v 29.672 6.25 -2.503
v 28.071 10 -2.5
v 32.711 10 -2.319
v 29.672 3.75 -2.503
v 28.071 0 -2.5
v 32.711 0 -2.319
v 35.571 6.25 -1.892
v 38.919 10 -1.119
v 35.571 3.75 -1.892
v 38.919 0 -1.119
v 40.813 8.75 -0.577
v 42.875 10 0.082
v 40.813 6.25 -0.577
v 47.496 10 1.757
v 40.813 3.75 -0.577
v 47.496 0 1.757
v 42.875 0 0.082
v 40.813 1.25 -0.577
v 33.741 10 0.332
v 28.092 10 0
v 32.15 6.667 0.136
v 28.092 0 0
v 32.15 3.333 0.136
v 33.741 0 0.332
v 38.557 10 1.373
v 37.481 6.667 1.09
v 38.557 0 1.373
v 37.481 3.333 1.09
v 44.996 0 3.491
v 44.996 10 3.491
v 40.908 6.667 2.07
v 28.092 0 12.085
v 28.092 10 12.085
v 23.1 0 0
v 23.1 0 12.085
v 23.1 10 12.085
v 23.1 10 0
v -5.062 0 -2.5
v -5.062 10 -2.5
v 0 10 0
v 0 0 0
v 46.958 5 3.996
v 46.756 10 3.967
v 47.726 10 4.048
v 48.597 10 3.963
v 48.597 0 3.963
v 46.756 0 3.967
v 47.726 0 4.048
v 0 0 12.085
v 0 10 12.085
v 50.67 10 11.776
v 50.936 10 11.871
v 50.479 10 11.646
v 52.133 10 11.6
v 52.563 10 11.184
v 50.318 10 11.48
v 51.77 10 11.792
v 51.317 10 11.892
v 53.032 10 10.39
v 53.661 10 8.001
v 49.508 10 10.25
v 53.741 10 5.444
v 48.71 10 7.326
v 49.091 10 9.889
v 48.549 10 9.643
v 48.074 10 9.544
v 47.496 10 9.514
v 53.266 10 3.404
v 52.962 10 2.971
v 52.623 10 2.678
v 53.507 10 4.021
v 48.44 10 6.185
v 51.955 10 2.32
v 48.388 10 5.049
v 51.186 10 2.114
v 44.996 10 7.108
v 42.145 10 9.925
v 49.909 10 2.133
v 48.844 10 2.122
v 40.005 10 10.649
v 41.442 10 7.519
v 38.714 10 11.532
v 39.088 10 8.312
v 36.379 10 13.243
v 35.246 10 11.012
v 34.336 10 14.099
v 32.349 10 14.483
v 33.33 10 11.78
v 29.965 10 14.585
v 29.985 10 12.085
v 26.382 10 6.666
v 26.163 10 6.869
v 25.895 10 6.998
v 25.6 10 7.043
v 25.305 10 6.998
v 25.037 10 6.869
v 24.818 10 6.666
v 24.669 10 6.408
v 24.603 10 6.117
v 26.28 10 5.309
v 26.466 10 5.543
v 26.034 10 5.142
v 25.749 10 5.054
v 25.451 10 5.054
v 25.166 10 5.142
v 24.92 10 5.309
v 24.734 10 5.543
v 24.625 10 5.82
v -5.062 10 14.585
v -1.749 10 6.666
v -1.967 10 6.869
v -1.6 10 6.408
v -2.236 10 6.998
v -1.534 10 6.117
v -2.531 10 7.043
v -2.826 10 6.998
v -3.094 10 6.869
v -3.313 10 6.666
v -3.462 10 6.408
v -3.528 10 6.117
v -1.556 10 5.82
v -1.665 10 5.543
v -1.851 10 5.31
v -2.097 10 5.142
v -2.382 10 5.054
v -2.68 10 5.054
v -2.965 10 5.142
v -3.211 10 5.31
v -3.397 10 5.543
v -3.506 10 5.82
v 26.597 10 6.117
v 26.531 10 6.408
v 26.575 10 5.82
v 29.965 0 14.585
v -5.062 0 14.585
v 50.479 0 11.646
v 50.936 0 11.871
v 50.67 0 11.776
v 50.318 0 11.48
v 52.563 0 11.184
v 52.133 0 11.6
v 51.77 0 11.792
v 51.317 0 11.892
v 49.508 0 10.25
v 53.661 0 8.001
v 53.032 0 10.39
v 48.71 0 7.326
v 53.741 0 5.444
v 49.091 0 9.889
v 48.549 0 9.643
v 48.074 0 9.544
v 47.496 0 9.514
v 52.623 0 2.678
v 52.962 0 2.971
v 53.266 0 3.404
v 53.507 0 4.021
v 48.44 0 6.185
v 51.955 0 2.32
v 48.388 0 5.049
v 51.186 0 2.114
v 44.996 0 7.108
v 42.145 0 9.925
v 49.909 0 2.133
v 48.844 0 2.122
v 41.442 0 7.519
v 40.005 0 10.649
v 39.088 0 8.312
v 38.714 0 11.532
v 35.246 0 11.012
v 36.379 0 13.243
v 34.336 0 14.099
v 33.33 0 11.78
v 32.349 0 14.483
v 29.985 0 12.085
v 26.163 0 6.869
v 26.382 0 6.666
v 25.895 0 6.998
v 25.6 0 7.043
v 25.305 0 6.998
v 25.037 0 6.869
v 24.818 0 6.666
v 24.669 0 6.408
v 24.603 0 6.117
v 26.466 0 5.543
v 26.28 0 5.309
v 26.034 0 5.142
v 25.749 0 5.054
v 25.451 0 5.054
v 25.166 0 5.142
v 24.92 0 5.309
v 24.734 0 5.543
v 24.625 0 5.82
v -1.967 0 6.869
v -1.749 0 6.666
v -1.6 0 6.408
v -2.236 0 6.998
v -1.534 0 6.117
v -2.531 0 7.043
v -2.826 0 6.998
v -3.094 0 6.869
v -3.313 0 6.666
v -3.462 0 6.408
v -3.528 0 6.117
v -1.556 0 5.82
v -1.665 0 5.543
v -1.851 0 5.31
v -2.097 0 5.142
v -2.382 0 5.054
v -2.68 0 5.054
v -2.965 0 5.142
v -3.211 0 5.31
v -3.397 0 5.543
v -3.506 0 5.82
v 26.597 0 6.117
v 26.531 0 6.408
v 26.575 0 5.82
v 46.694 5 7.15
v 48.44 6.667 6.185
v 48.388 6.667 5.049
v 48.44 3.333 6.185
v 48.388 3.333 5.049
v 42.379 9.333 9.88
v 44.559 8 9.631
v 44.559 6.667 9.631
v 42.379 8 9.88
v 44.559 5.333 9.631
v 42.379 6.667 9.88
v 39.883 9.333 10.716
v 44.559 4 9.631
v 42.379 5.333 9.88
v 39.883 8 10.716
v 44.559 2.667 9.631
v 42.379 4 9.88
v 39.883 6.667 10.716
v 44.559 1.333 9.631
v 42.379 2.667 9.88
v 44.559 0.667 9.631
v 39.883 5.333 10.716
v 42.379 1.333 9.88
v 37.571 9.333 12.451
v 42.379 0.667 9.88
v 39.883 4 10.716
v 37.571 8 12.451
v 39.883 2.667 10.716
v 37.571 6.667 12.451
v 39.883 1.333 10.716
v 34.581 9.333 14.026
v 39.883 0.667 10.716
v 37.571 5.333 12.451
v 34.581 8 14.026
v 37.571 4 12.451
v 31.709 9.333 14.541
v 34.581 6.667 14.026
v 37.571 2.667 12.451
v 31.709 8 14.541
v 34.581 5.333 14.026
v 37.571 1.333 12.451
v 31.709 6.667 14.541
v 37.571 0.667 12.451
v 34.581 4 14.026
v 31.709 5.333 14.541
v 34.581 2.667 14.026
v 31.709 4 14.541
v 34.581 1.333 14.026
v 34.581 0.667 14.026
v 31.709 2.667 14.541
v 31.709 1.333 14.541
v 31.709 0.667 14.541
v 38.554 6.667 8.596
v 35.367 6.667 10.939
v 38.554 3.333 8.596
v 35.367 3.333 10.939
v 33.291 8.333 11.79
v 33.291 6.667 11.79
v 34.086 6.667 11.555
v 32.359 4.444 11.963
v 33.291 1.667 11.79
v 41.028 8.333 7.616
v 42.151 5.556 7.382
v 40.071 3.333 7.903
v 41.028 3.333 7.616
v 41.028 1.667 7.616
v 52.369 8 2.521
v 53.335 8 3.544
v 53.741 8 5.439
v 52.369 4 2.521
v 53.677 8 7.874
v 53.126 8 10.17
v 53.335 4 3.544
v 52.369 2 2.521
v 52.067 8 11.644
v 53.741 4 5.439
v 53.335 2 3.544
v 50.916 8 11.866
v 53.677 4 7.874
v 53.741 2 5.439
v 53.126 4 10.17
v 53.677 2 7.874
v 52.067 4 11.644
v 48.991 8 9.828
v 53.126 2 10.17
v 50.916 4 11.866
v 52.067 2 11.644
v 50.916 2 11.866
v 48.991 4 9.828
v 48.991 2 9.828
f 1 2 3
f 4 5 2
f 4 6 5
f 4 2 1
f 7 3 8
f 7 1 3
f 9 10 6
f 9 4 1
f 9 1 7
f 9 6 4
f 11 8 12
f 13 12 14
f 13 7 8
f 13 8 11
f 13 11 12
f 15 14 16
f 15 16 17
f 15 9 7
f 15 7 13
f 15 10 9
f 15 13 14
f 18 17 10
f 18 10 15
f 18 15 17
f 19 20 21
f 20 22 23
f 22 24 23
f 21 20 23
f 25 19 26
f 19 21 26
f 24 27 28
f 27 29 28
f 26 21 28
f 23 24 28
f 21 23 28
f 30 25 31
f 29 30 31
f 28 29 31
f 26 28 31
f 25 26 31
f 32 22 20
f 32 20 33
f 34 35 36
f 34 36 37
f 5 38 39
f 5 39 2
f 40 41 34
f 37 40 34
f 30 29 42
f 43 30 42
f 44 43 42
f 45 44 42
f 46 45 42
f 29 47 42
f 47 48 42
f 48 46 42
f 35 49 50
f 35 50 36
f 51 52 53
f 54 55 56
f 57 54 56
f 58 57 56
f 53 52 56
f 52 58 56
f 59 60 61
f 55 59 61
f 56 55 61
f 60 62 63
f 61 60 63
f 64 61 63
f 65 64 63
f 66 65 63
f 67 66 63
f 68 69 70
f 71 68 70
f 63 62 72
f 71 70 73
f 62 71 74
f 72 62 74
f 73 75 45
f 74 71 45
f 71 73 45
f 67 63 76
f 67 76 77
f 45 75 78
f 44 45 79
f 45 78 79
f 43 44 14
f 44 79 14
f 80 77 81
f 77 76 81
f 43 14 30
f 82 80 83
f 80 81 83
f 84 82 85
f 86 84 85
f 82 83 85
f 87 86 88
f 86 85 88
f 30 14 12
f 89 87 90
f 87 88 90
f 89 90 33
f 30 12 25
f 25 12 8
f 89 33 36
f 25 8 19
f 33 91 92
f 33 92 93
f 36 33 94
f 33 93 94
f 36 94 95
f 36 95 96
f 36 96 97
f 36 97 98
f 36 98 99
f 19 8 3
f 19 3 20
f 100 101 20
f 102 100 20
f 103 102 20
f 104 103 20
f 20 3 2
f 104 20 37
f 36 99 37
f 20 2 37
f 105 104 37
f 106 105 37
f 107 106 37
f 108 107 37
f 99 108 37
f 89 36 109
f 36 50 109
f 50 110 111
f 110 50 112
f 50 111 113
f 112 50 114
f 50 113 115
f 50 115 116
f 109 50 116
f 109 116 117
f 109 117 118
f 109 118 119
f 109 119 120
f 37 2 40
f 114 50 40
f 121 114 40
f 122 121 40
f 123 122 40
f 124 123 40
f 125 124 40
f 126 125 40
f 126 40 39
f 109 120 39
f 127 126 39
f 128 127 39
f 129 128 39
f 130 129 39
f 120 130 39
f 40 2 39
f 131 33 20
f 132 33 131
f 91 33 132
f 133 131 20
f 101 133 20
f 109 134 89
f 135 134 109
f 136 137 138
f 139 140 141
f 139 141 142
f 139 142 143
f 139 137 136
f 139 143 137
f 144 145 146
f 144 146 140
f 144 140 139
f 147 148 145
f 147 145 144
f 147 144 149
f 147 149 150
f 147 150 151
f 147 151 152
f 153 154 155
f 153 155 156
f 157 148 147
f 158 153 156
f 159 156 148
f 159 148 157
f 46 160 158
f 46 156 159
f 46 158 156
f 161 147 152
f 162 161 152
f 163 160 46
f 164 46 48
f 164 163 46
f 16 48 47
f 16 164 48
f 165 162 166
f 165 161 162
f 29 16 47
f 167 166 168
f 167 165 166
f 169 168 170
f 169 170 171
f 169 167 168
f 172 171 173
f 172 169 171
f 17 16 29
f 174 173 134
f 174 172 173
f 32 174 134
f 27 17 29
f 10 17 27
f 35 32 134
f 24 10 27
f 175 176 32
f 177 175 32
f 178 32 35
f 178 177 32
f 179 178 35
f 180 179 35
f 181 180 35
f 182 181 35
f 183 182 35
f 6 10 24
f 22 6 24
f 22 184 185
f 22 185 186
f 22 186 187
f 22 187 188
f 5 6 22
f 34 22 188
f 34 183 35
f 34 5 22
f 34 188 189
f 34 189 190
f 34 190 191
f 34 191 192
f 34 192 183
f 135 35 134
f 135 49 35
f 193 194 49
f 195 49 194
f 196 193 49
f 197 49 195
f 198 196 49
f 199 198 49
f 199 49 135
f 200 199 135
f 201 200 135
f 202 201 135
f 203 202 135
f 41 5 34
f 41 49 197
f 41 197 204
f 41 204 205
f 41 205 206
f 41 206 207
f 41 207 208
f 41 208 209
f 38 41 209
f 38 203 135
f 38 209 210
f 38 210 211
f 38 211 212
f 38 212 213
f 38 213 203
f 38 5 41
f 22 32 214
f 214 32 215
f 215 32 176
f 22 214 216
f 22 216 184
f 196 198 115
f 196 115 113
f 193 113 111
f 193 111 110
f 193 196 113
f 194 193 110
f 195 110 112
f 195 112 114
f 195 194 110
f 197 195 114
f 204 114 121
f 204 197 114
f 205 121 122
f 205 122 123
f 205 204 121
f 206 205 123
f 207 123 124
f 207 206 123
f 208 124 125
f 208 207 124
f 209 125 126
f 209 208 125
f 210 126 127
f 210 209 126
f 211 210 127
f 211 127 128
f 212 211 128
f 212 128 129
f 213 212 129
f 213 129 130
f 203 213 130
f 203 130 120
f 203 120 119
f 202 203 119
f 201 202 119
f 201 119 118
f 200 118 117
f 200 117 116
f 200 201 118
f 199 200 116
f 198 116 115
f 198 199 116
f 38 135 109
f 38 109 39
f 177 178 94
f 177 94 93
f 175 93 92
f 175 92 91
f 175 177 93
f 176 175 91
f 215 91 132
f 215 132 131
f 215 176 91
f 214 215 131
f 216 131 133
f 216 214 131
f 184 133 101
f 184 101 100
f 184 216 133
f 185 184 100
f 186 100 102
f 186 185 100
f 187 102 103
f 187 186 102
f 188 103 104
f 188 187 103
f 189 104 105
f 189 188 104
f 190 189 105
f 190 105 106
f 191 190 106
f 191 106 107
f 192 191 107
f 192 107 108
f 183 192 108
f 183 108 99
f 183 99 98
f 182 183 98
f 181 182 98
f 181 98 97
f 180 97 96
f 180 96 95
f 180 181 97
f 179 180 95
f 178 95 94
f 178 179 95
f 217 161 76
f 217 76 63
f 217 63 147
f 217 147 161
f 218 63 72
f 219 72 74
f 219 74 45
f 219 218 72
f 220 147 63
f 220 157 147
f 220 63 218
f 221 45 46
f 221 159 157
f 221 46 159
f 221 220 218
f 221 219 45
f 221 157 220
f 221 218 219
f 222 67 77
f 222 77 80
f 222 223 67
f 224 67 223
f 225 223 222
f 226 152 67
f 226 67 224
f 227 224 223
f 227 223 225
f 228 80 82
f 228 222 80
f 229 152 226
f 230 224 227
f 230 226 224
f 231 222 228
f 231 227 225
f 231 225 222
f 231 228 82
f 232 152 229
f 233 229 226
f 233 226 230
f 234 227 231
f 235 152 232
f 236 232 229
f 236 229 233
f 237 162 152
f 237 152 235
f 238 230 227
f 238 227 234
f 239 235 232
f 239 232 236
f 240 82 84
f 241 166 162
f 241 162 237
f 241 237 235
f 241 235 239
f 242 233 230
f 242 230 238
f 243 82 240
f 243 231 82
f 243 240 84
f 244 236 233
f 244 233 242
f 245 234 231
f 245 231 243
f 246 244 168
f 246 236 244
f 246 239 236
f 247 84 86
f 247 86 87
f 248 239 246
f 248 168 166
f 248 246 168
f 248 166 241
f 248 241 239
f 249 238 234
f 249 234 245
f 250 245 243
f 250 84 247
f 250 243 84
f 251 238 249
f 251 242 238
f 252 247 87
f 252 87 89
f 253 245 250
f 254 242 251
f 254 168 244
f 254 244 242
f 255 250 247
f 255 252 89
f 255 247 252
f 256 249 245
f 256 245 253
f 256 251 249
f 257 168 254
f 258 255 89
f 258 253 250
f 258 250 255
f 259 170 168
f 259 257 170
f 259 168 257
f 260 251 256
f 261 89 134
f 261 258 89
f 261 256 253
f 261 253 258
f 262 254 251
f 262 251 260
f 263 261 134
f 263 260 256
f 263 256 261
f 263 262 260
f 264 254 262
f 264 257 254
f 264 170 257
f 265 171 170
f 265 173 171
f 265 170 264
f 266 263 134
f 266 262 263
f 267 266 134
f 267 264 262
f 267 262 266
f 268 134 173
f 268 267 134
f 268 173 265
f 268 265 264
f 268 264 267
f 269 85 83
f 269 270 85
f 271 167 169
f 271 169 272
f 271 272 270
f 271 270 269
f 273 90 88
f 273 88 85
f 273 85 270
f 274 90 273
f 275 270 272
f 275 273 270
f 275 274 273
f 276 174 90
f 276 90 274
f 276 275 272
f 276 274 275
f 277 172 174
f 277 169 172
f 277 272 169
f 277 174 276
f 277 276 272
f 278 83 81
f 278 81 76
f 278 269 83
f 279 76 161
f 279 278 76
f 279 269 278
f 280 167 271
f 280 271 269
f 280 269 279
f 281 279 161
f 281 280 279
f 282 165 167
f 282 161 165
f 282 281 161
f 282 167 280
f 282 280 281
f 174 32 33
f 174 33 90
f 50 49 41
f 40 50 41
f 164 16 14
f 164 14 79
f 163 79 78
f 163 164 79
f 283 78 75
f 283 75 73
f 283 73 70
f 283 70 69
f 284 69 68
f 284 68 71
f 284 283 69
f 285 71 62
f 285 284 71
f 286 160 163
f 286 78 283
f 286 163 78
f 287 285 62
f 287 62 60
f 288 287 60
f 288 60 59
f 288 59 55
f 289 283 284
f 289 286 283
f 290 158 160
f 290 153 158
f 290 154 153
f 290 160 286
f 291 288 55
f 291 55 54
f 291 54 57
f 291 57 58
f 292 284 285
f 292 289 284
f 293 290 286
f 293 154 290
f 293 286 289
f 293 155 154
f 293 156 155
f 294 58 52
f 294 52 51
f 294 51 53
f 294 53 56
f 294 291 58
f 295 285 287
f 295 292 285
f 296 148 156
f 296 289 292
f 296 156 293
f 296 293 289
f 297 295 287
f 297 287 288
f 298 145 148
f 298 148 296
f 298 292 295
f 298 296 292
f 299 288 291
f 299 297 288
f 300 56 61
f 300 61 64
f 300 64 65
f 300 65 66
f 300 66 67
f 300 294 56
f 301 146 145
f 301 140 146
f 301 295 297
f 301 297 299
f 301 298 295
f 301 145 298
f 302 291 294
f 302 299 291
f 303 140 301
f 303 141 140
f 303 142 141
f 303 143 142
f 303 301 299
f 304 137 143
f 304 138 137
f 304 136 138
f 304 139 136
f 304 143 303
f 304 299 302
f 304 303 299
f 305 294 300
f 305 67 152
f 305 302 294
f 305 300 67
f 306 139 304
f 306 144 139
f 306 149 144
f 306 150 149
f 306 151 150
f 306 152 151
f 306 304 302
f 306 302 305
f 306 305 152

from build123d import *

# Parameters (mm, degrees)
SKETCH_1_R            = 1
SKETCH_1_W            = 23.1
SKETCH_1_H            = 12.085165135
EXTRUDED_BASE_1_DEPTH = 10


with BuildPart() as part:
    # Sketch 1 → Extruded Base 1 (new body)
    with BuildSketch(Plane(origin=(0, 0, 0), x_dir=(1, 0, 0), z_dir=(0, 1, 0))):
        with BuildLine():
            Line((-2.5, 2.5), (28.071070534, 2.5))
            add(Edge.make_bspline(
                [(28.071070534, 2.5), (28.331969223, 2.504337706), (28.845516768, 2.51018953), (29.939145594, 2.504694278), (31.984433773, 2.429338039), (34.709286058, 2.103646301), (37.974258908, 1.388633447), (40.752673815, 0.619292769), (43.895049703, -0.404736284), (46.325704031, -1.319628266), (47.495600373, -1.757380693)],
                knots=[0.14365221, 0.14365221, 0.14365221, 0.14365221, 0.200430773, 0.257209336, 0.370766463, 0.597880716, 0.711437843, 0.824994969, 0.938552096, 1.052109223, 1.052109223, 1.052109223, 1.052109223], degree=3))
            add(Edge.make_bspline(
                [(47.495600373, -1.757380693), (49.778368159, -2.701741919), (50.728927455, -1.299086287), (54.288574053, -3.838501376), (53.749005389, -11.634192683), (49.553282958, -12.145217773), (50.182984305, -9.480528627), (47.495600373, -9.514141415)],
                knots=[0, 0, 0, 0, 0.410599119, 0.487696402, 0.739497672, 0.793875548, 1, 1, 1, 1], degree=3))
            add(Edge.make_bspline(
                [(47.495600373, -9.514141415), (46.828169892, -9.539567083), (45.998011965, -9.572230068), (44.989431931, -9.608782948), (44.412067214, -9.637341124), (43.455478476, -9.711299642), (42.328406271, -9.869883718), (40.930883577, -10.205336143), (39.823879664, -10.698992672), (38.852556569, -11.391687009), (37.674371462, -12.420253954), (36.176557674, -13.430480523), (34.608159651, -14.047926484), (33.267004893, -14.378054172), (31.995707757, -14.534066931), (30.882073519, -14.587489572), (30.265918727, -14.589827318), (29.965308829, -14.585165135)],
                knots=[0.000758631, 0.000758631, 0.000758631, 0.000758631, 0.068279684, 0.085159947, 0.10204021, 0.135800737, 0.20332179, 0.270842843, 0.405884949, 0.540927054, 0.67596916, 0.811011266, 0.878532319, 0.946053372, 1.013574425, 1.047334951, 1.081095478, 1.081095478, 1.081095478, 1.081095478], degree=3))
            Line((29.965308829, -14.585165135), (-2.5, -14.585165135))
            Line((-2.5, -14.585165135), (-5.061627791, -14.585165135))
            Line((-5.061627791, -14.585165135), (-5.061627791, 2.5))
            Line((-5.061627791, 2.5), (-2.5, 2.5))
        make_face()
        with Locations(Location((-2.530813895, -6.042582568, 0), (0, 0, 270))):
            Circle(SKETCH_1_R, mode=Mode.SUBTRACT)
        with Locations(Location((25.600001017, -6.042548927, 0), (0, 0, 270))):
            Circle(SKETCH_1_R, mode=Mode.SUBTRACT)
        with Locations((11.55, -6.042582568)):
            Rectangle(SKETCH_1_W, SKETCH_1_H, mode=Mode.SUBTRACT)
        with BuildLine():
            Line((28.092032276, -12.085165135), (29.985216163, -12.085165135))
            add(Edge.make_bspline(
                [(29.985216163, -12.085165135), (38.281074708, -12.220944361), (35.110824412, -7.484124297), (44.995600373, -7.107565188)],
                knots=[0, 0, 0, 0, 1, 1, 1, 1], degree=3))
            add(Edge.make_bspline(
                [(44.995600373, -7.107565188), (46.534540889, -7.083916605), (48.710327015, -7.325766452)],
                knots=[0, 0, 0, 1, 1, 1], degree=2))
            add(Edge.make_bspline(
                [(48.710327015, -7.325766452), (48.345253613, -6.197571714), (48.243086622, -5.009541806), (48.597312625, -3.963116498)],
                knots=[0, 0, 0, 0, 1, 1, 1, 1], degree=3))
            add(Edge.make_bspline(
                [(44.995600373, -3.491211899), (47.119447361, -4.265086008), (48.597312625, -3.963116498)],
                knots=[0, 0, 0, 1, 1, 1], degree=2))
            add(Edge.make_bspline(
                [(28.092032276, 0), (31.819034224, 0.063049174), (36.083764269, -0.156576391), (44.995600373, -3.491211899)],
                knots=[0.142072164, 0.142072164, 0.142072164, 0.142072164, 1, 1, 1, 1], degree=3))
            Line((28.092032276, 0), (28.092032276, -12.085165135))
        make_face(mode=Mode.SUBTRACT)
    extrude(amount=EXTRUDED_BASE_1_DEPTH)


solid = part.part
